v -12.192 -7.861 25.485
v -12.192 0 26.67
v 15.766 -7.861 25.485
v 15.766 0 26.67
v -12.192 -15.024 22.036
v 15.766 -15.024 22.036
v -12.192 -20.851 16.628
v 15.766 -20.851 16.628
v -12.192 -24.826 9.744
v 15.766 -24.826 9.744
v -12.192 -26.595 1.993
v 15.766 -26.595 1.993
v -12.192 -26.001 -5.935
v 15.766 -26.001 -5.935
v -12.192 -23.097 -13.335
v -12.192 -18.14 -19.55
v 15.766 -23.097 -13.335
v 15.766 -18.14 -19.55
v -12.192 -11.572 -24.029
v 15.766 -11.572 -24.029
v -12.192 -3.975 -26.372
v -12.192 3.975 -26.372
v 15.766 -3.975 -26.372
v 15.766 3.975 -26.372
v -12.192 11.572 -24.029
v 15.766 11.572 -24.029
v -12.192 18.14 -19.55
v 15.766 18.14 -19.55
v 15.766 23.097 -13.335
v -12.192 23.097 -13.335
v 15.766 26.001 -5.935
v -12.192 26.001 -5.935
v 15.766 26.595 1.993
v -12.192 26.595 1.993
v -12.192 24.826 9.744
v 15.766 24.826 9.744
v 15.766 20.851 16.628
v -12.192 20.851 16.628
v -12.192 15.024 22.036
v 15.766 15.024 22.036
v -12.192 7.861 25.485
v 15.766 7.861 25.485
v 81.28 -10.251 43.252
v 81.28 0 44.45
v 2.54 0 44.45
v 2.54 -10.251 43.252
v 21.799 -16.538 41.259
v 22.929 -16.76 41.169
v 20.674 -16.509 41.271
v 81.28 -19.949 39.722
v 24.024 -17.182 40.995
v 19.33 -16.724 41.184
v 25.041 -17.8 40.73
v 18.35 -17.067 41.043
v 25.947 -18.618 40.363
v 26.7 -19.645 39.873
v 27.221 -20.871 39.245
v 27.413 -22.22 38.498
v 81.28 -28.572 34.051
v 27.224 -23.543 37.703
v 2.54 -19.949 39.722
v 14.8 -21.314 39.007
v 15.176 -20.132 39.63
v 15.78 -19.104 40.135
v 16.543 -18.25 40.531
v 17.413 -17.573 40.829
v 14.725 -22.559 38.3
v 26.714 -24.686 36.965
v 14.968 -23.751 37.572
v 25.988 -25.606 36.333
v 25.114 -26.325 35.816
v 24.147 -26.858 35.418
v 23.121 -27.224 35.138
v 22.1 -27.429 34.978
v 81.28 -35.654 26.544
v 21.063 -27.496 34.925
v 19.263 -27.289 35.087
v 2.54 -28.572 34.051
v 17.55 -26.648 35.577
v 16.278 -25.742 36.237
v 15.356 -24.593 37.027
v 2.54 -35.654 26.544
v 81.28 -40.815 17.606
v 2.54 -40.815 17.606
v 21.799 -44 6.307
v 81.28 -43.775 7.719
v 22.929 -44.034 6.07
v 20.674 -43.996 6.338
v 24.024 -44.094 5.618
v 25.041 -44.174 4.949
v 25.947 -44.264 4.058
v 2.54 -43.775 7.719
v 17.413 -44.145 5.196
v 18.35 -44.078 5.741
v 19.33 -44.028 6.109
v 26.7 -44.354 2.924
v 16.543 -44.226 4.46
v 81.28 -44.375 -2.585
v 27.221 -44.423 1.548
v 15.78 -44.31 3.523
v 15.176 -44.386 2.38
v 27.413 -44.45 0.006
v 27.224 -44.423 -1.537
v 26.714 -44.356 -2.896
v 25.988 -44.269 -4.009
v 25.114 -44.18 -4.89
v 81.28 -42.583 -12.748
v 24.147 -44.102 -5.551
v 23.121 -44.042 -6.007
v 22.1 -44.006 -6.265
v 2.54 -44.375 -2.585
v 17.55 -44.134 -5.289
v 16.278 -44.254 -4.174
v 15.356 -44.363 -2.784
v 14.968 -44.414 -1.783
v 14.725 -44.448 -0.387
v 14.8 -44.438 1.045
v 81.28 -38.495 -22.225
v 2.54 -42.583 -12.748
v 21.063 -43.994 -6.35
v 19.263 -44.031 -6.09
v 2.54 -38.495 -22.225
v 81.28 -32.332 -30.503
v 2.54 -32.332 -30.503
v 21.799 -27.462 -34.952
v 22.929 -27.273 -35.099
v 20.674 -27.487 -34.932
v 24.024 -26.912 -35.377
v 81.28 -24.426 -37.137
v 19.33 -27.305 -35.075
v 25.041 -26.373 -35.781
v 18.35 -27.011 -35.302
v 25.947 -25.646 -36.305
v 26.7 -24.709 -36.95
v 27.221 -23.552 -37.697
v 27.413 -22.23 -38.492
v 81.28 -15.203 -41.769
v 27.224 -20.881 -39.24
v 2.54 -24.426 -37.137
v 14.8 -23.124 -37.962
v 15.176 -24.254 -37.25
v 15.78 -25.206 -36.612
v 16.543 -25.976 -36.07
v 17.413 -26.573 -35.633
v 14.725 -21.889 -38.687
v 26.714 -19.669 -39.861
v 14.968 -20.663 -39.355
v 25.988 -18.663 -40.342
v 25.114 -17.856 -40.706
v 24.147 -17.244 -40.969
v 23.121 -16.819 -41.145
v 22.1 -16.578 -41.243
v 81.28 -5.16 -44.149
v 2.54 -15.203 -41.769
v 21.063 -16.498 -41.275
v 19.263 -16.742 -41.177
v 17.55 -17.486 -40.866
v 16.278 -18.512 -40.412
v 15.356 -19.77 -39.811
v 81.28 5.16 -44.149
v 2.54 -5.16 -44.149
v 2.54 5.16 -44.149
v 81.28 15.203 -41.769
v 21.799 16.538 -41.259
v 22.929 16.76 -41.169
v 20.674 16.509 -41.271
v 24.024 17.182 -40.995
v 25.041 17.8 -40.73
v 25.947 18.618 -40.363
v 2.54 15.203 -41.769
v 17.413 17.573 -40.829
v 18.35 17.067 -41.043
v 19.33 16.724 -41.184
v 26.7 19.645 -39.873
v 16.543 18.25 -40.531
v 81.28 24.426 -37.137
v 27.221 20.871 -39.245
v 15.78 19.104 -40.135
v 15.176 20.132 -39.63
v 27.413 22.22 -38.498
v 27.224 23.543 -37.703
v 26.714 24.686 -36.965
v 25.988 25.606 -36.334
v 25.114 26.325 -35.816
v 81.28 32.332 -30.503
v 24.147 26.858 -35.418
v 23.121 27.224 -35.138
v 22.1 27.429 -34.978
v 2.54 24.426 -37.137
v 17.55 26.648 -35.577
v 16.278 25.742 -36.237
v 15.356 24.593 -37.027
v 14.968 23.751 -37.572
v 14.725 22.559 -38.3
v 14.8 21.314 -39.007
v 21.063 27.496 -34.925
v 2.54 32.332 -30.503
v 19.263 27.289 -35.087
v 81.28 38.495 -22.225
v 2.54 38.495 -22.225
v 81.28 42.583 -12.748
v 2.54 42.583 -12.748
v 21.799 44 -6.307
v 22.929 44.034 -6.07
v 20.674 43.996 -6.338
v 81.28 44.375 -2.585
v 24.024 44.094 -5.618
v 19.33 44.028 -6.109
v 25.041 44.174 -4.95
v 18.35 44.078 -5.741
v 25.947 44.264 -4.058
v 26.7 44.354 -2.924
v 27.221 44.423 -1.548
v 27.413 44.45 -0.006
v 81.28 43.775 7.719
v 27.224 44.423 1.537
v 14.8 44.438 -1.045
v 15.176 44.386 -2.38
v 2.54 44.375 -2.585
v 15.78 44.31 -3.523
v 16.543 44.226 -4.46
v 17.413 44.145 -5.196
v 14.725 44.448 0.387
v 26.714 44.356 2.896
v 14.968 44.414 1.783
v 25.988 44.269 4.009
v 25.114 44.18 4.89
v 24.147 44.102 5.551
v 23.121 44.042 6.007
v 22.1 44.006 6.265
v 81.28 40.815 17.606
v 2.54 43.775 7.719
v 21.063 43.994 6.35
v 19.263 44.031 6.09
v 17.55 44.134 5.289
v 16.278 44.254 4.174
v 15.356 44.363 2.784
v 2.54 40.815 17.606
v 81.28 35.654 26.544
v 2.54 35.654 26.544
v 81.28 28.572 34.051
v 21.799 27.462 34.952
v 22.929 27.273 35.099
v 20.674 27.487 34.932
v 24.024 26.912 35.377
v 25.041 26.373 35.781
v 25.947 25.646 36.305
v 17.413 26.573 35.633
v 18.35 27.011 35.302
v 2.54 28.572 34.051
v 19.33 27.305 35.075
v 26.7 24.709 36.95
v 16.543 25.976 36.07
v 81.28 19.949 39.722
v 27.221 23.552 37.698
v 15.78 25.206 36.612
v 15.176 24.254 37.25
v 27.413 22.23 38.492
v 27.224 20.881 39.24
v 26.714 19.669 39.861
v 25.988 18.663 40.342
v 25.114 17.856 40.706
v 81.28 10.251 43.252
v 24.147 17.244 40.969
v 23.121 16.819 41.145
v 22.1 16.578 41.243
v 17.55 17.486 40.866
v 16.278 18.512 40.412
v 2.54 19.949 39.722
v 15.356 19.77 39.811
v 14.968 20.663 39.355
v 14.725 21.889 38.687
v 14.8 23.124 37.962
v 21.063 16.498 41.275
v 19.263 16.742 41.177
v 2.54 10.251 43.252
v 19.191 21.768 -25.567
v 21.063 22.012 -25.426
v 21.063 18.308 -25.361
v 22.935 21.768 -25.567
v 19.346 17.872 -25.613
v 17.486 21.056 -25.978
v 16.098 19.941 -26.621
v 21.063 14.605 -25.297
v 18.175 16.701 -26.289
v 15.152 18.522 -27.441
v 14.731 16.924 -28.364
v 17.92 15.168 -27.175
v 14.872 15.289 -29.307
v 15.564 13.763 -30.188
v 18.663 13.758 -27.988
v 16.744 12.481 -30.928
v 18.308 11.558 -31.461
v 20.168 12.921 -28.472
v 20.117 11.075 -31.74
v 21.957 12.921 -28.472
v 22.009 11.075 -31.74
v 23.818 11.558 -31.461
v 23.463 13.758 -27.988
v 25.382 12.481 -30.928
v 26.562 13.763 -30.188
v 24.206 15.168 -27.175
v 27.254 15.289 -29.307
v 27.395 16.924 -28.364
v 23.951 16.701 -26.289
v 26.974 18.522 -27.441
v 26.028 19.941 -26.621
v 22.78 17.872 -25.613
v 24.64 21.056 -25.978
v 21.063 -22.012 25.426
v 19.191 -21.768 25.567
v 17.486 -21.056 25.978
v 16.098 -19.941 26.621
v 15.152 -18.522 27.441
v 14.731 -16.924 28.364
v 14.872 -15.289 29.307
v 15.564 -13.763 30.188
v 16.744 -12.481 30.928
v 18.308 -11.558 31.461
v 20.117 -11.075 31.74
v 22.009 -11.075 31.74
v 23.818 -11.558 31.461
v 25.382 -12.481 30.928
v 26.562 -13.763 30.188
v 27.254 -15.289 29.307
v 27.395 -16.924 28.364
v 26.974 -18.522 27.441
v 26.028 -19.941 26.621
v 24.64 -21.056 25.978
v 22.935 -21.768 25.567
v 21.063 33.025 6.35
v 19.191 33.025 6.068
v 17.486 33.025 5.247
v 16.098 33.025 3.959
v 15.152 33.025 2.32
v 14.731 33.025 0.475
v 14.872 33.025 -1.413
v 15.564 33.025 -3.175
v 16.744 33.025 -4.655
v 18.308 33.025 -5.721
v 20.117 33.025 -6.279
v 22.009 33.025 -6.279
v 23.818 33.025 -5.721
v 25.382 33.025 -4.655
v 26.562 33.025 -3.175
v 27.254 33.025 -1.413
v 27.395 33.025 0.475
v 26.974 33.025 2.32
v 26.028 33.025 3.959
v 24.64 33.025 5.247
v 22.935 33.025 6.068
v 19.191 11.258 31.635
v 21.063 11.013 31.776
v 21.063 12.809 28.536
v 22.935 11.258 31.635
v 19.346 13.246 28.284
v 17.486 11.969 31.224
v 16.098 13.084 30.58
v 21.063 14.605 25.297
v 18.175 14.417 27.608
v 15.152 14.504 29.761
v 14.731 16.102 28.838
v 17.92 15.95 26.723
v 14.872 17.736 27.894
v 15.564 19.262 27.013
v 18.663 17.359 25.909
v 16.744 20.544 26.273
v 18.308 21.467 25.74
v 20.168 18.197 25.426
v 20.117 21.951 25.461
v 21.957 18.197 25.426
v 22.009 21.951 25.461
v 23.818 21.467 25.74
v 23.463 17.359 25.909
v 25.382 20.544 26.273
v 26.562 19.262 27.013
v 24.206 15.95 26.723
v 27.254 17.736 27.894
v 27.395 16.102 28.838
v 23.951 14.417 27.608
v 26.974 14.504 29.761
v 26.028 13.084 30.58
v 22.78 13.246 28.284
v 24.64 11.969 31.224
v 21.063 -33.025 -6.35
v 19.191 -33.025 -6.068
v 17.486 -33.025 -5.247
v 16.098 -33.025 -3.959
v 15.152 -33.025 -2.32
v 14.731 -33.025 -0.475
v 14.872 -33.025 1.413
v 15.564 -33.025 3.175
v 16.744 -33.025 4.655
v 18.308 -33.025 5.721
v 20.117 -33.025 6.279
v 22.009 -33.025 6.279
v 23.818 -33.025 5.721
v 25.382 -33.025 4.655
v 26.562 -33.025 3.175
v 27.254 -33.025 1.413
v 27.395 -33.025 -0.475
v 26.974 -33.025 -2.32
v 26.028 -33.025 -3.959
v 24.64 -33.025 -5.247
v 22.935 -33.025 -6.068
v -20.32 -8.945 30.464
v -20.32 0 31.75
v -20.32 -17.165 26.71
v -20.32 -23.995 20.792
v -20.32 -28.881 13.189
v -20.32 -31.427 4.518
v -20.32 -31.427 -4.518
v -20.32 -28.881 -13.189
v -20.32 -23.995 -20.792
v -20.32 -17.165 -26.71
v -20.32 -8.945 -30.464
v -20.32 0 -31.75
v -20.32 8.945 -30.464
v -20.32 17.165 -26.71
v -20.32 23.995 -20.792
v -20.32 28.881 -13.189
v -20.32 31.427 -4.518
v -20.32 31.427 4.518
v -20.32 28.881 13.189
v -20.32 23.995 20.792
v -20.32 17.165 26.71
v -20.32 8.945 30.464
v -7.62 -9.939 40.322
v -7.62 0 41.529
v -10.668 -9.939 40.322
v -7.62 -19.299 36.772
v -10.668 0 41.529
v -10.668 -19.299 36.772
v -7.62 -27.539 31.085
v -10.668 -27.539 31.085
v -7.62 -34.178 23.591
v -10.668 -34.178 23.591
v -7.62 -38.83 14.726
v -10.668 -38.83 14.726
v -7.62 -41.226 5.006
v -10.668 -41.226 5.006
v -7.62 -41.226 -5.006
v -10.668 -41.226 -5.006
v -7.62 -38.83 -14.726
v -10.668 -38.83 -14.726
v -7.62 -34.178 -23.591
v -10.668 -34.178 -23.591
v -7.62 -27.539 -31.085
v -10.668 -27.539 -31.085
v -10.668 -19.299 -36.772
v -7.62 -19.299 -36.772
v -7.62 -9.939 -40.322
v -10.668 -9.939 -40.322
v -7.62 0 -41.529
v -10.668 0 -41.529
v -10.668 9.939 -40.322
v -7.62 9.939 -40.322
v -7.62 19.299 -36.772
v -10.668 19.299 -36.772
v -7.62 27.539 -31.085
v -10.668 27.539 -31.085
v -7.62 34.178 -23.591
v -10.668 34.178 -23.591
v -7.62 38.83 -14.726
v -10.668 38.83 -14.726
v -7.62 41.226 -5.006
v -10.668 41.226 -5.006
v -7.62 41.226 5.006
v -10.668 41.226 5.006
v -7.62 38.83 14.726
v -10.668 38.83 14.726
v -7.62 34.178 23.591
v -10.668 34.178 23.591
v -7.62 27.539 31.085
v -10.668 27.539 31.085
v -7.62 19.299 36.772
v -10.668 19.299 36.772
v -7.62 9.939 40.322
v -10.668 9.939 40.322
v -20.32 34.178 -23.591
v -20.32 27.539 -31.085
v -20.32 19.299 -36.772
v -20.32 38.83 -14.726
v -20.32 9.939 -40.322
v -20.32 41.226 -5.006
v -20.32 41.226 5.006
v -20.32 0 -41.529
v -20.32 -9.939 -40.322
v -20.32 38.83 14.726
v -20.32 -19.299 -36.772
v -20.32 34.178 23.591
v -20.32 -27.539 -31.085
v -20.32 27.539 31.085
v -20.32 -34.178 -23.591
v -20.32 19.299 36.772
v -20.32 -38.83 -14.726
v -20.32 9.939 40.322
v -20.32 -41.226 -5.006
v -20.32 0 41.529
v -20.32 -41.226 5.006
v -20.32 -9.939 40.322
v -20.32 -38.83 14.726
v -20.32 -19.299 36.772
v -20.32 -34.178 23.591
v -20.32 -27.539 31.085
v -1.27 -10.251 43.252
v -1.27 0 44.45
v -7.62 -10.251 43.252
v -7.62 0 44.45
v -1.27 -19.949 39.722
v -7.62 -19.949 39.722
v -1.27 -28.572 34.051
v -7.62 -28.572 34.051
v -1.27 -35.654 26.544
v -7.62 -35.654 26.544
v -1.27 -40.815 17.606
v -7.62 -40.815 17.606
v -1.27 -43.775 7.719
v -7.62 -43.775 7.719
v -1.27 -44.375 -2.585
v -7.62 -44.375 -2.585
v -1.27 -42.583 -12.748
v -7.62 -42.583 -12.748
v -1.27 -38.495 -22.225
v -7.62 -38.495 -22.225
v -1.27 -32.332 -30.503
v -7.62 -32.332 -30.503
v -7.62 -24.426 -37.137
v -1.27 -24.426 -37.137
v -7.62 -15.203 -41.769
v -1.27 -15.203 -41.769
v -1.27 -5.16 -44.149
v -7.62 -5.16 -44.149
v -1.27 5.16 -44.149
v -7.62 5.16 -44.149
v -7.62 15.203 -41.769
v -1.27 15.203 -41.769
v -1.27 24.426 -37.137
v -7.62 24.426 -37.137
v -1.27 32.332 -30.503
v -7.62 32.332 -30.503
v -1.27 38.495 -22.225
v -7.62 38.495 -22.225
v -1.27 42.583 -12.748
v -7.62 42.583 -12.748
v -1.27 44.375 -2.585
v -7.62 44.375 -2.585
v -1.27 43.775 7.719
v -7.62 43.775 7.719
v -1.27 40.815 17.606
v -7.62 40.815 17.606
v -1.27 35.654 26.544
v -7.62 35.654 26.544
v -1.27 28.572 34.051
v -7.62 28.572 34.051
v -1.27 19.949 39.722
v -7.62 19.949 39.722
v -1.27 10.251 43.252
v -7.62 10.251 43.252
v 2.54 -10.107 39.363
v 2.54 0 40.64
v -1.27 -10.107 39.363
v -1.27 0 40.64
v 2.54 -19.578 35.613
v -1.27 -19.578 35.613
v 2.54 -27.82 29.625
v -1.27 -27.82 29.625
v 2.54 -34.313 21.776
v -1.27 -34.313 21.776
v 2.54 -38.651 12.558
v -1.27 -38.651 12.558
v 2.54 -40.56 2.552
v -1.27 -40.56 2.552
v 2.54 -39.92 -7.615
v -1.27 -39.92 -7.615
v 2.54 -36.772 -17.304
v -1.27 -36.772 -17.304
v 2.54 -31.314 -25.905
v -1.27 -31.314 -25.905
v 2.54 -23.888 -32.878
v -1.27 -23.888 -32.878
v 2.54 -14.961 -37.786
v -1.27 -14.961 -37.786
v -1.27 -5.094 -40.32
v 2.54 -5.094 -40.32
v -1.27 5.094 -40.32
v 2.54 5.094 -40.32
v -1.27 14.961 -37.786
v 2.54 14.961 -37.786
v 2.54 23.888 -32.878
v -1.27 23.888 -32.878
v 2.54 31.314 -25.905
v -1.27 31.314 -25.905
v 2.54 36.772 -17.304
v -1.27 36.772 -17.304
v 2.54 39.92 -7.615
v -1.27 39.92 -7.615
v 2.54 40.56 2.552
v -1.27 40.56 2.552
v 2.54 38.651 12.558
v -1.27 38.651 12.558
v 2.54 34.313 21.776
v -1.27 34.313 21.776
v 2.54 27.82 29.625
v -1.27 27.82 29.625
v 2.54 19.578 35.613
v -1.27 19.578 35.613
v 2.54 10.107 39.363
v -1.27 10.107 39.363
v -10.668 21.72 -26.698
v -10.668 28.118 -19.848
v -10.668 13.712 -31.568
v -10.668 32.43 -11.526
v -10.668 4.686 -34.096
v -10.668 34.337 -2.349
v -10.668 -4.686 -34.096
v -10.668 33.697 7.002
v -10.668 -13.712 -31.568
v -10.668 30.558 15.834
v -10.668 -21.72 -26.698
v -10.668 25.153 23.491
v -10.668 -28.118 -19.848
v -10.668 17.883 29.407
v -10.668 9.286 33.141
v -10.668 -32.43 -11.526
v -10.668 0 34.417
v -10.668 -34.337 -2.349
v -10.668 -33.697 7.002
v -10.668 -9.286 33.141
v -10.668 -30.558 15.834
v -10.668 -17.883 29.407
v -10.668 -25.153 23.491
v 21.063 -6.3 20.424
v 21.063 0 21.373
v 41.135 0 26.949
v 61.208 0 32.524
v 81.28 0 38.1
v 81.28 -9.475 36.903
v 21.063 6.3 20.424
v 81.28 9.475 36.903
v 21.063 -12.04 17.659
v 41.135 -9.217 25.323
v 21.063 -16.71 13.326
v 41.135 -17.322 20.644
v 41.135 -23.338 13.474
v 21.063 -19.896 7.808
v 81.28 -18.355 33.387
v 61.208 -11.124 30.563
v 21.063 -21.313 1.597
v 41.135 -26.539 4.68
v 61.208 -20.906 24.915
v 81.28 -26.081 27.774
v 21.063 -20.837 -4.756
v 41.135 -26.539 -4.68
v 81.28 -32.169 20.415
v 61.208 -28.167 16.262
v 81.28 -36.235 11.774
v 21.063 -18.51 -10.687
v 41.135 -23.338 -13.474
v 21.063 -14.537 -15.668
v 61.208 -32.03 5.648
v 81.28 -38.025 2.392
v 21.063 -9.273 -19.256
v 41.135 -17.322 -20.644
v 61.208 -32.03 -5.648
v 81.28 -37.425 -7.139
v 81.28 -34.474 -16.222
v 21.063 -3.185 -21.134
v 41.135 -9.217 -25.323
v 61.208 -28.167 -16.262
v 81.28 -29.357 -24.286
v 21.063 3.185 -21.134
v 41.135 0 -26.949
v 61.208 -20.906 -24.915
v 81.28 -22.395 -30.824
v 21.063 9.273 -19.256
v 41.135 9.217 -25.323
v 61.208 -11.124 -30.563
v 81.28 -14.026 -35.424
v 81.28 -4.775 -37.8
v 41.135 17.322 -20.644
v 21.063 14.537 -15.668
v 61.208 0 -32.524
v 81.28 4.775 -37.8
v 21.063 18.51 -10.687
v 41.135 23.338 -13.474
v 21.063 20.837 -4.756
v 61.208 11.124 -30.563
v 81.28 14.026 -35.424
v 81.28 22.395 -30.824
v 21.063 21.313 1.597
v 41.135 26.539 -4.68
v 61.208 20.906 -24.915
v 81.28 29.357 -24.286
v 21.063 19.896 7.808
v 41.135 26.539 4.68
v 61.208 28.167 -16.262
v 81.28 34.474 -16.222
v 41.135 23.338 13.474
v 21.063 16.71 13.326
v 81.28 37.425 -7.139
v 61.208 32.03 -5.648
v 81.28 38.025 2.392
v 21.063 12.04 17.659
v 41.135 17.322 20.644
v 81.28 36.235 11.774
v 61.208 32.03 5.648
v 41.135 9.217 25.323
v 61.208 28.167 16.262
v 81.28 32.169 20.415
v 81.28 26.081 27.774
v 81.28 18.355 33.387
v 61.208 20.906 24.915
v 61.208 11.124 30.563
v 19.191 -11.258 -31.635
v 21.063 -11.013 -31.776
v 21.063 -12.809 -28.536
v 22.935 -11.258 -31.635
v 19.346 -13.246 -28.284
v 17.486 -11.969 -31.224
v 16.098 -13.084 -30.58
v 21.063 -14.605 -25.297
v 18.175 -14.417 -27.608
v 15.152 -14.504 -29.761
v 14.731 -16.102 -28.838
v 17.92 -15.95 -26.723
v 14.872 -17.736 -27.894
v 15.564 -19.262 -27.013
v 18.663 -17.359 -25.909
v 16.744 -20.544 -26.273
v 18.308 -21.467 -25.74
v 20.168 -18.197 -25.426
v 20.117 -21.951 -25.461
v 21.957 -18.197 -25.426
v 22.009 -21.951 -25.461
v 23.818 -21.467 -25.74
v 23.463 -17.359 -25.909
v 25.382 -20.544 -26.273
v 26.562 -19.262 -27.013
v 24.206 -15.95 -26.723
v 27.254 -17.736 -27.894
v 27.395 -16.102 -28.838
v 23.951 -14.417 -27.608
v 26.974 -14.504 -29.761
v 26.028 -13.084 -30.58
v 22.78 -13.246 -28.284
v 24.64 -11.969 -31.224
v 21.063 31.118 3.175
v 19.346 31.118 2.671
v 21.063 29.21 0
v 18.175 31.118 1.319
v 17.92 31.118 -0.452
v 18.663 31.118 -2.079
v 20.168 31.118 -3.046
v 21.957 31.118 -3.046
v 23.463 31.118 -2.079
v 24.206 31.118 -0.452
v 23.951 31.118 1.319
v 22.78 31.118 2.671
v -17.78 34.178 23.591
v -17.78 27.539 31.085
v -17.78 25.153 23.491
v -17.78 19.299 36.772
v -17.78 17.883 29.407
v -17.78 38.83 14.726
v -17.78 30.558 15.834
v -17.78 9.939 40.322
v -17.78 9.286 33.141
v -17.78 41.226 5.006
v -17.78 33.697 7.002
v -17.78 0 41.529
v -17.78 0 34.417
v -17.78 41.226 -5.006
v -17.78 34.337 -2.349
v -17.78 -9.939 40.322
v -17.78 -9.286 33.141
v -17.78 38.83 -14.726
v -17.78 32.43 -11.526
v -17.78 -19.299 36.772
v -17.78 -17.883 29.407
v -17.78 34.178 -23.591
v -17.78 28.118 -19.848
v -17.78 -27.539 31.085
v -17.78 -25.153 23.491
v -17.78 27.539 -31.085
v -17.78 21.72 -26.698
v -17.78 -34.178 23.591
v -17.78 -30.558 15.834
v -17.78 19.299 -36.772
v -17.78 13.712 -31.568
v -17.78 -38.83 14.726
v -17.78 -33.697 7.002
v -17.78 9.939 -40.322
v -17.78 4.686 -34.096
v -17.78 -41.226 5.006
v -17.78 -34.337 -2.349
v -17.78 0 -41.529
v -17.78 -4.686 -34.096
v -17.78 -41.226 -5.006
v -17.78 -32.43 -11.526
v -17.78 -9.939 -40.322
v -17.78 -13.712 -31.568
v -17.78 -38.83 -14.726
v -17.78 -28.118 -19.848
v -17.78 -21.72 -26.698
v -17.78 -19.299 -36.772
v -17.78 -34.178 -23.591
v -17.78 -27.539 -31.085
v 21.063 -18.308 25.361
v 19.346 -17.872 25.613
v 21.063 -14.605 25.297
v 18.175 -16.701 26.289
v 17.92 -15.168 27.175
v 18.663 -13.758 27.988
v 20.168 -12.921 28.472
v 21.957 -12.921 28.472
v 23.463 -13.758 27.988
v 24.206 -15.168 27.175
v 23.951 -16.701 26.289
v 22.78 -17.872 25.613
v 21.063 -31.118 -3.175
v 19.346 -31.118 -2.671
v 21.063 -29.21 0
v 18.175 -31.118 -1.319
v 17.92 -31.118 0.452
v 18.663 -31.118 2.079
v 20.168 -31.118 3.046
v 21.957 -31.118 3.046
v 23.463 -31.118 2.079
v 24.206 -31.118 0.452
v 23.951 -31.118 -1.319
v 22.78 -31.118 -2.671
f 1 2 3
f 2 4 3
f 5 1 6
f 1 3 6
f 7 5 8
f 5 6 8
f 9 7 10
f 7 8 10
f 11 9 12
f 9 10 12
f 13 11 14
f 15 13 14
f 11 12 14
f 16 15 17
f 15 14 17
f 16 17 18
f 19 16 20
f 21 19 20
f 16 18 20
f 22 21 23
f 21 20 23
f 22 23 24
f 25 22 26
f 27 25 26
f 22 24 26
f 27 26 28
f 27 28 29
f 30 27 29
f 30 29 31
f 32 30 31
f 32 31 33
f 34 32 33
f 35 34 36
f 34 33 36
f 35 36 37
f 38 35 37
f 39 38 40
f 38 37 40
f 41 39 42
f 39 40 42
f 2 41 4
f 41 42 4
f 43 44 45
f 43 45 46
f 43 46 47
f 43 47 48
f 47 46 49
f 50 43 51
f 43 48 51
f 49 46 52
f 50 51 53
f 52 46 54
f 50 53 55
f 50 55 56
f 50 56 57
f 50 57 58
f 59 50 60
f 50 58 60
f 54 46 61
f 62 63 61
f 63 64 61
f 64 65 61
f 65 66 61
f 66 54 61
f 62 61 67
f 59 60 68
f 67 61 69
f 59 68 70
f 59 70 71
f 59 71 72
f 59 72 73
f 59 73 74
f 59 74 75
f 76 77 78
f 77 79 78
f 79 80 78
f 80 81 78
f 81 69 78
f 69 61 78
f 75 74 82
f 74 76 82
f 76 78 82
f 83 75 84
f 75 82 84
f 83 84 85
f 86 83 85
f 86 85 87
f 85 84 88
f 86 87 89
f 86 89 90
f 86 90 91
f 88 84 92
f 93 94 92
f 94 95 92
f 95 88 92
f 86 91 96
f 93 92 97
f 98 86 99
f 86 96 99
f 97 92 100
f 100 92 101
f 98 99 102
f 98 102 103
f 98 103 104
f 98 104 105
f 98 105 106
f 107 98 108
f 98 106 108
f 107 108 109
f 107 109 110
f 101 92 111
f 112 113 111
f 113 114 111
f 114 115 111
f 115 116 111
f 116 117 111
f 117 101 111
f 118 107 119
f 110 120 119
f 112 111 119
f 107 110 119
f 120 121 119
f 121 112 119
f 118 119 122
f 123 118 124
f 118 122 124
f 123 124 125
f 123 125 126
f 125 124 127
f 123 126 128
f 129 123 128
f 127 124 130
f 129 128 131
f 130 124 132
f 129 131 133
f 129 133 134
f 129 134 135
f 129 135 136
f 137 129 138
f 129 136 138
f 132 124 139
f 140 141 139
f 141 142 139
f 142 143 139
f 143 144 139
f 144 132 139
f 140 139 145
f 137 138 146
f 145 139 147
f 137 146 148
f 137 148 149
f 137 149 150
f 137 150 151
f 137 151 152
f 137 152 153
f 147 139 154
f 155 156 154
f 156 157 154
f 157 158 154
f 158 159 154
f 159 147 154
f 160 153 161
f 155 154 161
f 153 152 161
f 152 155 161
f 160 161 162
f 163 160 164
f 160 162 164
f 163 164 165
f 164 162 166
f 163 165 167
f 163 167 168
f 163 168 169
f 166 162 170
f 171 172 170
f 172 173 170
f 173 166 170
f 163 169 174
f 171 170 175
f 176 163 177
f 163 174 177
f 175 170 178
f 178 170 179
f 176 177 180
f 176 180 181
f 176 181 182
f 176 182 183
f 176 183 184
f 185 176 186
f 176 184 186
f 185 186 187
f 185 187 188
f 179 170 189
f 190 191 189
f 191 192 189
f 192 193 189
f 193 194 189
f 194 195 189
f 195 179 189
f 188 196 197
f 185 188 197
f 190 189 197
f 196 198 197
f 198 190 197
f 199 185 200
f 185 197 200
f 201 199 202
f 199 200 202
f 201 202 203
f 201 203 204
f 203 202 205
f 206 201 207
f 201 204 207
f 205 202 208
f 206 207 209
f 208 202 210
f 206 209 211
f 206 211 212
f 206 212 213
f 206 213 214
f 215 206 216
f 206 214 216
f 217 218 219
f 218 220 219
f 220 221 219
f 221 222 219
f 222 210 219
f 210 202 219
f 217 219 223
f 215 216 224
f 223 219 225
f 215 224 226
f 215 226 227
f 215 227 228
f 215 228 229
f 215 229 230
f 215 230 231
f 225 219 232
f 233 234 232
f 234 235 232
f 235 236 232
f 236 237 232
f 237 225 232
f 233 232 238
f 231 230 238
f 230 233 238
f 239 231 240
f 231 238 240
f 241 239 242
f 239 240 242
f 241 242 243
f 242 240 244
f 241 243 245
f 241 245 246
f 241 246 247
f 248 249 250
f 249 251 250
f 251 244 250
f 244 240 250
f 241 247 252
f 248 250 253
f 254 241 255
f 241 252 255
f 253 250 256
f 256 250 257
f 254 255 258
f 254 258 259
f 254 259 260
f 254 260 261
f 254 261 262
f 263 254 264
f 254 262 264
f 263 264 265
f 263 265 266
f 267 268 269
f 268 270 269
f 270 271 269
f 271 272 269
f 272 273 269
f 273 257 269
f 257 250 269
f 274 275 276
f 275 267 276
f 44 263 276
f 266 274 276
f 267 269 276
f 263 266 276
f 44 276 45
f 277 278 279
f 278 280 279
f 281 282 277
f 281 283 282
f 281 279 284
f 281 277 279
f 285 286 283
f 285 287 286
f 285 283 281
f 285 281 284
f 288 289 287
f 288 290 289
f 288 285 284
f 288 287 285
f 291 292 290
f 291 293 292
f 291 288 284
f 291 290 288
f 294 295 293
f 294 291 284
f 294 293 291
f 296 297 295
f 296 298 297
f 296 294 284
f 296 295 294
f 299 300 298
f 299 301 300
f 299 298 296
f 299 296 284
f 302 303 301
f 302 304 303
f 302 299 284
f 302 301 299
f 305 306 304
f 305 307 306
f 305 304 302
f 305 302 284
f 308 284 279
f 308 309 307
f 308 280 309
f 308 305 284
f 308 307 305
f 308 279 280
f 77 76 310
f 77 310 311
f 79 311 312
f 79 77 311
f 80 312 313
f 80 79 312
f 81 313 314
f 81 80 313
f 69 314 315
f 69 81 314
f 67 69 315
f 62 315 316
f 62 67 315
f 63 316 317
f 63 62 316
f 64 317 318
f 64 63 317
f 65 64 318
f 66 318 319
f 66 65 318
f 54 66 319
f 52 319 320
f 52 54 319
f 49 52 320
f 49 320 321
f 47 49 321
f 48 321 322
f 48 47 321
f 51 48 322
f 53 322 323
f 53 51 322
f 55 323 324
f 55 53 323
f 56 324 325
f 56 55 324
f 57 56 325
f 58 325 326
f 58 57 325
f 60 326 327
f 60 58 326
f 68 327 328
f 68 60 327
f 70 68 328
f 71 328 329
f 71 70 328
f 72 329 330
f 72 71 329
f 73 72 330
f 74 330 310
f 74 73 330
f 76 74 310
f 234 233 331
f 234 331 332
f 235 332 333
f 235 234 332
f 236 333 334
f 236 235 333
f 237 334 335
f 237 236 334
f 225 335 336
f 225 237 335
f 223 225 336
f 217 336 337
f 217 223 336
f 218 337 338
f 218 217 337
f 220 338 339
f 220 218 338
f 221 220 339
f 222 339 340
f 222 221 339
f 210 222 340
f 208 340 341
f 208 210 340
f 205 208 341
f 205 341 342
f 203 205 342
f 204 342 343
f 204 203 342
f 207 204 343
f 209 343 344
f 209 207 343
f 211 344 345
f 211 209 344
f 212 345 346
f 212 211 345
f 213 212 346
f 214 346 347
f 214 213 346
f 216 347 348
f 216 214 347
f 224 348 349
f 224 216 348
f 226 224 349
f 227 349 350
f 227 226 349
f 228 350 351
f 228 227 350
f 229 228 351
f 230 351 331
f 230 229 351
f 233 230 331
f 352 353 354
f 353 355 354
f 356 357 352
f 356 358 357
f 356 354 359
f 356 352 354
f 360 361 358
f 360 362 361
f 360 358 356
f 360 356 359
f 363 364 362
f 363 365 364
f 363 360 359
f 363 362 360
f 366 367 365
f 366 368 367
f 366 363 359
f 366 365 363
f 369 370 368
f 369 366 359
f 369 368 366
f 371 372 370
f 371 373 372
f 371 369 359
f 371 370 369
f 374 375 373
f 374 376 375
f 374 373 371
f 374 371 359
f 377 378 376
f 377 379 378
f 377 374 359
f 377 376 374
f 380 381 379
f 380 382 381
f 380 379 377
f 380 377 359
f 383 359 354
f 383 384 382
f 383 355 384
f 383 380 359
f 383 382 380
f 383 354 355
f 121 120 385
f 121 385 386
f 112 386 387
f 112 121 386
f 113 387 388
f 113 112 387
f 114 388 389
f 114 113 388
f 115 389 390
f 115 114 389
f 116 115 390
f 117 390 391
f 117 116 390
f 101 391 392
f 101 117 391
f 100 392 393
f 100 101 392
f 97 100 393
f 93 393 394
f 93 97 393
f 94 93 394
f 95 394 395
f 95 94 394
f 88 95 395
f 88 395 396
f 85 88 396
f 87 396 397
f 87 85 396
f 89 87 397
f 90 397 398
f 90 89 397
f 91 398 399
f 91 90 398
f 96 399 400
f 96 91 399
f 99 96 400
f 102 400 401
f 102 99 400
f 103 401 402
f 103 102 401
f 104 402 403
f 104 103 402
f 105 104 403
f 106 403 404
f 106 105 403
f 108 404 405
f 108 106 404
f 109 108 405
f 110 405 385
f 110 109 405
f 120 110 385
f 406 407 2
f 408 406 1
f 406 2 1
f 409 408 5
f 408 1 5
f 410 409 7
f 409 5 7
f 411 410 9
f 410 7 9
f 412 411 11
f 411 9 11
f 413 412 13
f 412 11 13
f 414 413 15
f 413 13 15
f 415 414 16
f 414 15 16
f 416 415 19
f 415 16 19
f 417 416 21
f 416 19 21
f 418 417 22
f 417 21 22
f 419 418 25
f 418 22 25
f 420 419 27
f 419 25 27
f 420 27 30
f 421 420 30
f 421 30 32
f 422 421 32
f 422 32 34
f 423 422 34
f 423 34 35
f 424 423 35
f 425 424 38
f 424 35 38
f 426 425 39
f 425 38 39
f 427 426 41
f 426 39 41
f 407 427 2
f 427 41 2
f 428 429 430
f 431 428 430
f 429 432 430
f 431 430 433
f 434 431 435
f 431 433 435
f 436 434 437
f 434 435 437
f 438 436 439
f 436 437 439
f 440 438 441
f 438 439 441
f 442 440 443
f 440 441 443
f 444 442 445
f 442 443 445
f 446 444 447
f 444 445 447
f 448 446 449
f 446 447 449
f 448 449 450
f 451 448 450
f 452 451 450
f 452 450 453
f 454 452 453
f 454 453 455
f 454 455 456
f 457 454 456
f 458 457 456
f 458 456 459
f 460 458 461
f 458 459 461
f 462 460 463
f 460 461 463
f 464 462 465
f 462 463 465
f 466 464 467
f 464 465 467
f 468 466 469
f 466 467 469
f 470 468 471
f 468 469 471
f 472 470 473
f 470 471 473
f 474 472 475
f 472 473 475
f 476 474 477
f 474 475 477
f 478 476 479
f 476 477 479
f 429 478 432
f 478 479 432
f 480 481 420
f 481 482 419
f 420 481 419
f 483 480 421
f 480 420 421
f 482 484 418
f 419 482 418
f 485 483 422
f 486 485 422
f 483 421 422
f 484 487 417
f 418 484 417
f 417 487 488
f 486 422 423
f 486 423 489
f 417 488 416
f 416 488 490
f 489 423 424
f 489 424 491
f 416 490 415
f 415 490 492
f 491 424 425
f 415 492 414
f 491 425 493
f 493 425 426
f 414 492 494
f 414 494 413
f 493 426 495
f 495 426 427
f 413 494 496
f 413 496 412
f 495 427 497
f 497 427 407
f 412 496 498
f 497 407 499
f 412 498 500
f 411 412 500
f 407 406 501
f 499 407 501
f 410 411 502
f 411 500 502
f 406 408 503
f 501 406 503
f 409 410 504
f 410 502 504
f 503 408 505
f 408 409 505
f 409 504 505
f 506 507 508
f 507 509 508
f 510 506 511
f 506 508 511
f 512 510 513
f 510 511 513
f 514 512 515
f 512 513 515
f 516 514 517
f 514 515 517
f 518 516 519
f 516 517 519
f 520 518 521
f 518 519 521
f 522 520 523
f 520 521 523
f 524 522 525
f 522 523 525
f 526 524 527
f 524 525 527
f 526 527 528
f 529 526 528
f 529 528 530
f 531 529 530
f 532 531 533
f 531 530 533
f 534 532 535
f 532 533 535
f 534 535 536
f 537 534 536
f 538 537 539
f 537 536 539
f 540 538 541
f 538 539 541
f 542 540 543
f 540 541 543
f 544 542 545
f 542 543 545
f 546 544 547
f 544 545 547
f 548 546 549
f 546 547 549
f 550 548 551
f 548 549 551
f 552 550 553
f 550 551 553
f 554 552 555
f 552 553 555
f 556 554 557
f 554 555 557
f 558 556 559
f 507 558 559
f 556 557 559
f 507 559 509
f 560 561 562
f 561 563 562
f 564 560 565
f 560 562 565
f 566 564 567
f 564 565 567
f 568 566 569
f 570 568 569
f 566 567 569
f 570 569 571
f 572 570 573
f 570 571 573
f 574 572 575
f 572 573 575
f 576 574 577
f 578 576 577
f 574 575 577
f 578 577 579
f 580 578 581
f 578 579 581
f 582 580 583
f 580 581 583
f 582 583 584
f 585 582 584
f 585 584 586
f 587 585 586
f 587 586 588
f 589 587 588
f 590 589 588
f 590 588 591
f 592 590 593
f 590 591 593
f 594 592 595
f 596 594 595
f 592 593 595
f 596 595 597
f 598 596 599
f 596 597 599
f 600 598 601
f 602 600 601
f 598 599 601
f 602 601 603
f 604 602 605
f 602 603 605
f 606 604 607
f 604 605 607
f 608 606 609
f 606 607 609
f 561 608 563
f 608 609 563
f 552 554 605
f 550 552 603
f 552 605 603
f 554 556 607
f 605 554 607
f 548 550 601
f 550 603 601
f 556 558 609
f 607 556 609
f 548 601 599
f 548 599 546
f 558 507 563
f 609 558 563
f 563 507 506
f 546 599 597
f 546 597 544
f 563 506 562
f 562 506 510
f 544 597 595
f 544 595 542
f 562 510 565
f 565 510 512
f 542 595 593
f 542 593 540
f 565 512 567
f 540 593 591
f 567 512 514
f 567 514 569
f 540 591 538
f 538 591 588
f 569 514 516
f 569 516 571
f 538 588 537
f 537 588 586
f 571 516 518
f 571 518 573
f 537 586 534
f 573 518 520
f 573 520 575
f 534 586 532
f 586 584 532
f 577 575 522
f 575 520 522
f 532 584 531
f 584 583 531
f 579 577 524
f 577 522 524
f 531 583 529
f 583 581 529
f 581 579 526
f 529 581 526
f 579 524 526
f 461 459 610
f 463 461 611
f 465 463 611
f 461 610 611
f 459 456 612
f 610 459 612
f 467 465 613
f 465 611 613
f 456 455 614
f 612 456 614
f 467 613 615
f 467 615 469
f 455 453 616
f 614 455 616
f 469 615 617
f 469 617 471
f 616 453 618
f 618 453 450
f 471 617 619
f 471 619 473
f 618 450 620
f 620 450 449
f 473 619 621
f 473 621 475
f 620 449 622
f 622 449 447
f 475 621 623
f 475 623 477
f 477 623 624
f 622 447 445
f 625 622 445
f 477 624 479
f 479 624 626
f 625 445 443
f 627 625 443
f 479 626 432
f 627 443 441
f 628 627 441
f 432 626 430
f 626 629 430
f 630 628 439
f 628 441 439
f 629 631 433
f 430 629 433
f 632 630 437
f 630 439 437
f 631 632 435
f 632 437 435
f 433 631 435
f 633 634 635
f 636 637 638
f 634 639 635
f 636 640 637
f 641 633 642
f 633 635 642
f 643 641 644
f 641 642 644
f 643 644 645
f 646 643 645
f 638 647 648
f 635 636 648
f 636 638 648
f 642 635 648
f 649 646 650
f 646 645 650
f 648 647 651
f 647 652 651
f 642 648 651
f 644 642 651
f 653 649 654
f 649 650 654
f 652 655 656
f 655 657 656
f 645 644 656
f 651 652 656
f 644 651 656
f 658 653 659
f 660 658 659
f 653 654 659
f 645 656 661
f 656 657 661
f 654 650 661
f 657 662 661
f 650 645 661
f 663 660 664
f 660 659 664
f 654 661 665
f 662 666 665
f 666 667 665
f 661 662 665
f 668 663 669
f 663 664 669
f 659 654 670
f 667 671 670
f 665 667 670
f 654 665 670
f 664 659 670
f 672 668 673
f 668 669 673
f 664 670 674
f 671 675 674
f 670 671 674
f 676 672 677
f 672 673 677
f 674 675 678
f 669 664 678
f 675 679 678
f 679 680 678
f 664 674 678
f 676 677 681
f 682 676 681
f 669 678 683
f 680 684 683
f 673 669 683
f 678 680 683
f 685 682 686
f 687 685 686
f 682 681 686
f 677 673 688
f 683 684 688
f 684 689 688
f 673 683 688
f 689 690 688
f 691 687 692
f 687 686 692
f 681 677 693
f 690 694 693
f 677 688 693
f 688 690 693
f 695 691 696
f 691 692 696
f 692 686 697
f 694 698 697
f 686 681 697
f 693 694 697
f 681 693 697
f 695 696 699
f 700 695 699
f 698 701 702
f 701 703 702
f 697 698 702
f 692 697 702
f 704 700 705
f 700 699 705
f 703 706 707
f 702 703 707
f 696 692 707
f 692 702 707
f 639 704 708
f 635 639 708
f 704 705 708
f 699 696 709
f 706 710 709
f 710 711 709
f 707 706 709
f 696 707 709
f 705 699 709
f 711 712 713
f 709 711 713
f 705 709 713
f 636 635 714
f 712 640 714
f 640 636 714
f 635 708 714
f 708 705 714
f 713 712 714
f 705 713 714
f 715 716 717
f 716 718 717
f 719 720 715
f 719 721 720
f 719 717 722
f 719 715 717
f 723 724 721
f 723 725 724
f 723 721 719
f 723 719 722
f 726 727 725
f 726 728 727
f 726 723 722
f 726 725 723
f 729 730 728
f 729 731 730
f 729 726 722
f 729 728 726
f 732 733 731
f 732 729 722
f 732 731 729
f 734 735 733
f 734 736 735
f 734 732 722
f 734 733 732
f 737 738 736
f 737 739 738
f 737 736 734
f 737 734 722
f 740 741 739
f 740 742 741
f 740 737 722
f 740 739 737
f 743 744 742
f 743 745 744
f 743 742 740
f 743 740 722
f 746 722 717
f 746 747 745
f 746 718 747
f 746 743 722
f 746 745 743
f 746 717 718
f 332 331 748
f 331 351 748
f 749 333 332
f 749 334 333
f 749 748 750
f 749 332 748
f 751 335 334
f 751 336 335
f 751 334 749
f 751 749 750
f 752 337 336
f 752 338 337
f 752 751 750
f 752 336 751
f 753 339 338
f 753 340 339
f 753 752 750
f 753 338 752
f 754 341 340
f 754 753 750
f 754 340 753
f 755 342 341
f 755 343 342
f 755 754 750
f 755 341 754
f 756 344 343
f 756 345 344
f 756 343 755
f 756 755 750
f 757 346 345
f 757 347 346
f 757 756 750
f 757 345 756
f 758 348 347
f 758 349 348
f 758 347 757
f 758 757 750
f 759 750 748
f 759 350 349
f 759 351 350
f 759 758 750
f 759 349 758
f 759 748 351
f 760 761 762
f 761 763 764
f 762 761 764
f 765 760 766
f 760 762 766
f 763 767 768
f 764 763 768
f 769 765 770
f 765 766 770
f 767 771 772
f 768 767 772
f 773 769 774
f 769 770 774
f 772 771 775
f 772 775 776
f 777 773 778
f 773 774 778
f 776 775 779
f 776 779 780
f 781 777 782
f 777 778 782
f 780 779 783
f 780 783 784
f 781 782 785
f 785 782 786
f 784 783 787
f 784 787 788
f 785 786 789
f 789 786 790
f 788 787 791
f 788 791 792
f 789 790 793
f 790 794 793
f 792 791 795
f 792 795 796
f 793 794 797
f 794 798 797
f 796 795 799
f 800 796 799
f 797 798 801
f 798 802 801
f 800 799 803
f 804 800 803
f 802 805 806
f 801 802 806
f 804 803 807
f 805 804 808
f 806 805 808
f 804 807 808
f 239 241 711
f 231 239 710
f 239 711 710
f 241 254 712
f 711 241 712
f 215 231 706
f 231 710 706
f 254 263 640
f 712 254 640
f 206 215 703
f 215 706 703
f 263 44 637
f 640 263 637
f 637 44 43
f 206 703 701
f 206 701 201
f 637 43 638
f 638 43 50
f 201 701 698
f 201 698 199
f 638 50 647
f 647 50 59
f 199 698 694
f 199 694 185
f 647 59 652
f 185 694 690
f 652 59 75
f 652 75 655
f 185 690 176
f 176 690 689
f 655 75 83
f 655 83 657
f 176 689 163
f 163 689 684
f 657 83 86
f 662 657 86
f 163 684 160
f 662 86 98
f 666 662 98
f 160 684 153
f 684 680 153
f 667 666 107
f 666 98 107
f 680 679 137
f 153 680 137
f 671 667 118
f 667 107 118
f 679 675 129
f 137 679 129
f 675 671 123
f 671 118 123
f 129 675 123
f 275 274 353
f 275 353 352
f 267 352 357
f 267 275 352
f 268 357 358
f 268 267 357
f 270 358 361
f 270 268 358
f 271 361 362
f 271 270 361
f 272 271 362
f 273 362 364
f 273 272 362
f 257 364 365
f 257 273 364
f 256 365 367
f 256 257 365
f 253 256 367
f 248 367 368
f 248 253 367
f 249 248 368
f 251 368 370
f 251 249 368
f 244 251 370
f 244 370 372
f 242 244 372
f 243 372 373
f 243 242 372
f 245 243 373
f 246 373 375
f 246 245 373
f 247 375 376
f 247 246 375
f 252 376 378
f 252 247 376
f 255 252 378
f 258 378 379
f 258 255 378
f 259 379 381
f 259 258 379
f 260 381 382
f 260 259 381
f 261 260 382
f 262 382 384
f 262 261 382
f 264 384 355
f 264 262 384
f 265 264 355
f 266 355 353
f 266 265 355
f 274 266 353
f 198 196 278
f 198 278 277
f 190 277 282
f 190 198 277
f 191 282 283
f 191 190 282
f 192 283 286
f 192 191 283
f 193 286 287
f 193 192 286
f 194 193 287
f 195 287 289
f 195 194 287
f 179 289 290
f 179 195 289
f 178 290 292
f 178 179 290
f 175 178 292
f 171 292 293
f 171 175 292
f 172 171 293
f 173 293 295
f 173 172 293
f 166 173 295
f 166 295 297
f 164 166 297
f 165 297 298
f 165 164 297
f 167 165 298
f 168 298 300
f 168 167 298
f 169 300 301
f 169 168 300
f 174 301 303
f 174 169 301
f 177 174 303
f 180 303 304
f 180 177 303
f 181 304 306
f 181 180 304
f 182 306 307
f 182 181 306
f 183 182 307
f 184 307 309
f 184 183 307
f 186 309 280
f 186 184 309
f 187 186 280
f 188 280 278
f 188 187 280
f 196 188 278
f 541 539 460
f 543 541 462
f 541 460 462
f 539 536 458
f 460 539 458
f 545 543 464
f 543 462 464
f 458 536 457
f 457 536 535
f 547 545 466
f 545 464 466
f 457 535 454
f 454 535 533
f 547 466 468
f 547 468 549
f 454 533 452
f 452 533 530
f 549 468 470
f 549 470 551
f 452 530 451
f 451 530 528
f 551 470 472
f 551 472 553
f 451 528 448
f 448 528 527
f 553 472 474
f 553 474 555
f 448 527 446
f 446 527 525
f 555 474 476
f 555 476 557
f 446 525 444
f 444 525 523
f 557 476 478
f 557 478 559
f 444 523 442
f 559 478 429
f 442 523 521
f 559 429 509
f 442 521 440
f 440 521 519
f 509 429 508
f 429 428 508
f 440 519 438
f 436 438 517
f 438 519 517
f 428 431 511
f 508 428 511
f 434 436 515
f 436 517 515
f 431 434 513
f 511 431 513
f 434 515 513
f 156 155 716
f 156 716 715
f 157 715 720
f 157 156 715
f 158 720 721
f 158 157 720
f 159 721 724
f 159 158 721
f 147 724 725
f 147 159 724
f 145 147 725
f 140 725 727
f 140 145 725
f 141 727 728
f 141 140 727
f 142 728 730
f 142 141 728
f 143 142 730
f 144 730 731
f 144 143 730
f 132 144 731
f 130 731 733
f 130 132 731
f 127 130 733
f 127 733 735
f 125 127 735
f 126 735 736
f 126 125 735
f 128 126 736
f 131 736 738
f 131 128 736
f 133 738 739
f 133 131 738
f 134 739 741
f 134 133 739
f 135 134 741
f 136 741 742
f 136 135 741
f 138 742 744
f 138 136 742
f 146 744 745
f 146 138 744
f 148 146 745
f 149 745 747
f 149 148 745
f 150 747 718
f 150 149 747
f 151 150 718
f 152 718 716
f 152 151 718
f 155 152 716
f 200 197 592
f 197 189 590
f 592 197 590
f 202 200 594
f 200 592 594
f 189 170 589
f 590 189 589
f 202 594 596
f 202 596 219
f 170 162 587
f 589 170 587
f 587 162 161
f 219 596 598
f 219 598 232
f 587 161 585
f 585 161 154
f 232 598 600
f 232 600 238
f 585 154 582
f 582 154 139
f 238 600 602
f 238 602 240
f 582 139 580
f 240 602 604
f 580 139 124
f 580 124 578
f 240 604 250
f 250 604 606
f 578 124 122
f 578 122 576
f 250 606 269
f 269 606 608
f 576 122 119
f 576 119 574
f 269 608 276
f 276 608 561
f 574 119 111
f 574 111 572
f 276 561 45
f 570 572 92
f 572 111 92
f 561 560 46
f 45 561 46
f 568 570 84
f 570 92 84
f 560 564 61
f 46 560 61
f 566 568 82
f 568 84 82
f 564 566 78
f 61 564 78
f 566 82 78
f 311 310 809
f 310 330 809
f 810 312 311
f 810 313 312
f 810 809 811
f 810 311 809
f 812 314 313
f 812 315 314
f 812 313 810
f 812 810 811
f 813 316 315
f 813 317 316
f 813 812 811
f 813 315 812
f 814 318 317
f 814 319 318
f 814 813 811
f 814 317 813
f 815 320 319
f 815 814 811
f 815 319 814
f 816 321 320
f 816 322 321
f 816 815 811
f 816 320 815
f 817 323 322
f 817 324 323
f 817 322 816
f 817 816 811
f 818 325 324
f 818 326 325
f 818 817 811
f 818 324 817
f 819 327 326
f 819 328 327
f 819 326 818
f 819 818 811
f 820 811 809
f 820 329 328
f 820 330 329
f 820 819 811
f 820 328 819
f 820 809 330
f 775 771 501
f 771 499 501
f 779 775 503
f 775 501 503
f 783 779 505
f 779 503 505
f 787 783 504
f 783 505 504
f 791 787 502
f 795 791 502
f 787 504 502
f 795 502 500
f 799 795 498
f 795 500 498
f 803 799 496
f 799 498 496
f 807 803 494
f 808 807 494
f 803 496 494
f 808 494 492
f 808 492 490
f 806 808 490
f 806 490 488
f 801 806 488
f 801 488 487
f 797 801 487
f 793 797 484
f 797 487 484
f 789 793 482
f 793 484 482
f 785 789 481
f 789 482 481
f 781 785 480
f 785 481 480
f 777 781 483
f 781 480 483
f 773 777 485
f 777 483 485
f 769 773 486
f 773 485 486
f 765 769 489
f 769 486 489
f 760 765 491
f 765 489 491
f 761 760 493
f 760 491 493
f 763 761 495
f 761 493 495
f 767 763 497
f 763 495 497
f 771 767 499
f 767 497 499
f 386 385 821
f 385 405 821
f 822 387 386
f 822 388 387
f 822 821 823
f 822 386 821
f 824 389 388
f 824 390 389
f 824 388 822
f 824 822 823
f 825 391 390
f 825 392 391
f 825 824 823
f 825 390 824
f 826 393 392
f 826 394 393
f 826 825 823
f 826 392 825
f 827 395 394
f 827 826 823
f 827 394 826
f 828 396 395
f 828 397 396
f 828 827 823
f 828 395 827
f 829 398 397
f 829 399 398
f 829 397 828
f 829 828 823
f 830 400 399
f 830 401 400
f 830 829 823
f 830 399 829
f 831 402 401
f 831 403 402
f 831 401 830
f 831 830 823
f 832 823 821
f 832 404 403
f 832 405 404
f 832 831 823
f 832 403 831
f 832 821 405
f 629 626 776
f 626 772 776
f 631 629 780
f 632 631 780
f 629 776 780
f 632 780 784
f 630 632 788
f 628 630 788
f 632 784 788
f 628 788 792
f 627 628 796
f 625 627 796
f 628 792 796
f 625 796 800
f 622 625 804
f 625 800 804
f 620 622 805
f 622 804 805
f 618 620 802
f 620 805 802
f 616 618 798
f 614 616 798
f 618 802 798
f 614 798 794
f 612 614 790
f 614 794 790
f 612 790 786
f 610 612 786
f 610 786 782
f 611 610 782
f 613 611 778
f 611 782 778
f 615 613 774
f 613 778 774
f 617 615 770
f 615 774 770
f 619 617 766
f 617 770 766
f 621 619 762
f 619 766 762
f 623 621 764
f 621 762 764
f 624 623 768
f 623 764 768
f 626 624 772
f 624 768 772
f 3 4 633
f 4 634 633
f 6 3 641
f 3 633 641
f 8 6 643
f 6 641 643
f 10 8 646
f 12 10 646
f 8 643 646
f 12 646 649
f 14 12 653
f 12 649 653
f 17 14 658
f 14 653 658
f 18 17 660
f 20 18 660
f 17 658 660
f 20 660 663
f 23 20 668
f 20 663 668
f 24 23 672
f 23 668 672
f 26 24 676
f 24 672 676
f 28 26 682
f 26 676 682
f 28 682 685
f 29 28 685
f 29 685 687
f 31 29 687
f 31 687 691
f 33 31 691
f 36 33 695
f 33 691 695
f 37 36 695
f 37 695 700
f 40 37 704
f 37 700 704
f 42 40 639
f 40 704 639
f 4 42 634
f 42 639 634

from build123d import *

# Parameters (mm, degrees)
CIRPATTERN1_COUNT = 6


with BuildPart() as part:
    # Sketch2 → Revolve2 (revolve)
    with BuildSketch(Plane.XY, mode=Mode.PRIVATE) as revolve2_sk:
        Polygon((-20.32, 31.75), (-12.192, 26.67), (15.766051224, 26.67), (21.06299661, 21.373054614), (81.28, 38.1), (81.28, 44.45), (2.54, 44.45), (2.54, 40.64), (-1.27, 40.64), (-1.27, 44.45), (-7.62, 44.45), (-7.62, 41.529), (-10.668, 41.529), (-10.668, 34.417), (-17.78, 34.417), (-17.78, 41.529), (-20.32, 41.529), align=None)
    revolve(revolve2_sk.sketch.rotate(Axis((0, 0, 0), (1, 0, 0)), 90), axis=Axis((0, 0, 0), (1, 0, 0)))

    # Sketch4 → 1/2 (0.5) Diameter Hole1 (revolve, cut)
    with BuildSketch(Plane(origin=(21.06299661, 44.45, 0), x_dir=(0, 0, 1), z_dir=(1, 0, 0))):
        Polygon((0, 0), (0, 15.24), (6.35, 11.424535069), (6.35, 0), align=None)
    f_1_2_0_5_diameter_hole1 = revolve(axis=Axis((21.06299661, 50.8, 0), (0, -1, 0)), mode=Mode.SUBTRACT)

    # CirPattern1: 1/2 (0.5) Diameter Hole1 ×6 about axis
    cirpattern1_axis = Axis((0, 0, 0), (1, 0, 0))
    for i in range(1, CIRPATTERN1_COUNT):
        add(f_1_2_0_5_diameter_hole1.rotate(cirpattern1_axis, i * 360 / CIRPATTERN1_COUNT), mode=Mode.SUBTRACT)


solid = part.part
